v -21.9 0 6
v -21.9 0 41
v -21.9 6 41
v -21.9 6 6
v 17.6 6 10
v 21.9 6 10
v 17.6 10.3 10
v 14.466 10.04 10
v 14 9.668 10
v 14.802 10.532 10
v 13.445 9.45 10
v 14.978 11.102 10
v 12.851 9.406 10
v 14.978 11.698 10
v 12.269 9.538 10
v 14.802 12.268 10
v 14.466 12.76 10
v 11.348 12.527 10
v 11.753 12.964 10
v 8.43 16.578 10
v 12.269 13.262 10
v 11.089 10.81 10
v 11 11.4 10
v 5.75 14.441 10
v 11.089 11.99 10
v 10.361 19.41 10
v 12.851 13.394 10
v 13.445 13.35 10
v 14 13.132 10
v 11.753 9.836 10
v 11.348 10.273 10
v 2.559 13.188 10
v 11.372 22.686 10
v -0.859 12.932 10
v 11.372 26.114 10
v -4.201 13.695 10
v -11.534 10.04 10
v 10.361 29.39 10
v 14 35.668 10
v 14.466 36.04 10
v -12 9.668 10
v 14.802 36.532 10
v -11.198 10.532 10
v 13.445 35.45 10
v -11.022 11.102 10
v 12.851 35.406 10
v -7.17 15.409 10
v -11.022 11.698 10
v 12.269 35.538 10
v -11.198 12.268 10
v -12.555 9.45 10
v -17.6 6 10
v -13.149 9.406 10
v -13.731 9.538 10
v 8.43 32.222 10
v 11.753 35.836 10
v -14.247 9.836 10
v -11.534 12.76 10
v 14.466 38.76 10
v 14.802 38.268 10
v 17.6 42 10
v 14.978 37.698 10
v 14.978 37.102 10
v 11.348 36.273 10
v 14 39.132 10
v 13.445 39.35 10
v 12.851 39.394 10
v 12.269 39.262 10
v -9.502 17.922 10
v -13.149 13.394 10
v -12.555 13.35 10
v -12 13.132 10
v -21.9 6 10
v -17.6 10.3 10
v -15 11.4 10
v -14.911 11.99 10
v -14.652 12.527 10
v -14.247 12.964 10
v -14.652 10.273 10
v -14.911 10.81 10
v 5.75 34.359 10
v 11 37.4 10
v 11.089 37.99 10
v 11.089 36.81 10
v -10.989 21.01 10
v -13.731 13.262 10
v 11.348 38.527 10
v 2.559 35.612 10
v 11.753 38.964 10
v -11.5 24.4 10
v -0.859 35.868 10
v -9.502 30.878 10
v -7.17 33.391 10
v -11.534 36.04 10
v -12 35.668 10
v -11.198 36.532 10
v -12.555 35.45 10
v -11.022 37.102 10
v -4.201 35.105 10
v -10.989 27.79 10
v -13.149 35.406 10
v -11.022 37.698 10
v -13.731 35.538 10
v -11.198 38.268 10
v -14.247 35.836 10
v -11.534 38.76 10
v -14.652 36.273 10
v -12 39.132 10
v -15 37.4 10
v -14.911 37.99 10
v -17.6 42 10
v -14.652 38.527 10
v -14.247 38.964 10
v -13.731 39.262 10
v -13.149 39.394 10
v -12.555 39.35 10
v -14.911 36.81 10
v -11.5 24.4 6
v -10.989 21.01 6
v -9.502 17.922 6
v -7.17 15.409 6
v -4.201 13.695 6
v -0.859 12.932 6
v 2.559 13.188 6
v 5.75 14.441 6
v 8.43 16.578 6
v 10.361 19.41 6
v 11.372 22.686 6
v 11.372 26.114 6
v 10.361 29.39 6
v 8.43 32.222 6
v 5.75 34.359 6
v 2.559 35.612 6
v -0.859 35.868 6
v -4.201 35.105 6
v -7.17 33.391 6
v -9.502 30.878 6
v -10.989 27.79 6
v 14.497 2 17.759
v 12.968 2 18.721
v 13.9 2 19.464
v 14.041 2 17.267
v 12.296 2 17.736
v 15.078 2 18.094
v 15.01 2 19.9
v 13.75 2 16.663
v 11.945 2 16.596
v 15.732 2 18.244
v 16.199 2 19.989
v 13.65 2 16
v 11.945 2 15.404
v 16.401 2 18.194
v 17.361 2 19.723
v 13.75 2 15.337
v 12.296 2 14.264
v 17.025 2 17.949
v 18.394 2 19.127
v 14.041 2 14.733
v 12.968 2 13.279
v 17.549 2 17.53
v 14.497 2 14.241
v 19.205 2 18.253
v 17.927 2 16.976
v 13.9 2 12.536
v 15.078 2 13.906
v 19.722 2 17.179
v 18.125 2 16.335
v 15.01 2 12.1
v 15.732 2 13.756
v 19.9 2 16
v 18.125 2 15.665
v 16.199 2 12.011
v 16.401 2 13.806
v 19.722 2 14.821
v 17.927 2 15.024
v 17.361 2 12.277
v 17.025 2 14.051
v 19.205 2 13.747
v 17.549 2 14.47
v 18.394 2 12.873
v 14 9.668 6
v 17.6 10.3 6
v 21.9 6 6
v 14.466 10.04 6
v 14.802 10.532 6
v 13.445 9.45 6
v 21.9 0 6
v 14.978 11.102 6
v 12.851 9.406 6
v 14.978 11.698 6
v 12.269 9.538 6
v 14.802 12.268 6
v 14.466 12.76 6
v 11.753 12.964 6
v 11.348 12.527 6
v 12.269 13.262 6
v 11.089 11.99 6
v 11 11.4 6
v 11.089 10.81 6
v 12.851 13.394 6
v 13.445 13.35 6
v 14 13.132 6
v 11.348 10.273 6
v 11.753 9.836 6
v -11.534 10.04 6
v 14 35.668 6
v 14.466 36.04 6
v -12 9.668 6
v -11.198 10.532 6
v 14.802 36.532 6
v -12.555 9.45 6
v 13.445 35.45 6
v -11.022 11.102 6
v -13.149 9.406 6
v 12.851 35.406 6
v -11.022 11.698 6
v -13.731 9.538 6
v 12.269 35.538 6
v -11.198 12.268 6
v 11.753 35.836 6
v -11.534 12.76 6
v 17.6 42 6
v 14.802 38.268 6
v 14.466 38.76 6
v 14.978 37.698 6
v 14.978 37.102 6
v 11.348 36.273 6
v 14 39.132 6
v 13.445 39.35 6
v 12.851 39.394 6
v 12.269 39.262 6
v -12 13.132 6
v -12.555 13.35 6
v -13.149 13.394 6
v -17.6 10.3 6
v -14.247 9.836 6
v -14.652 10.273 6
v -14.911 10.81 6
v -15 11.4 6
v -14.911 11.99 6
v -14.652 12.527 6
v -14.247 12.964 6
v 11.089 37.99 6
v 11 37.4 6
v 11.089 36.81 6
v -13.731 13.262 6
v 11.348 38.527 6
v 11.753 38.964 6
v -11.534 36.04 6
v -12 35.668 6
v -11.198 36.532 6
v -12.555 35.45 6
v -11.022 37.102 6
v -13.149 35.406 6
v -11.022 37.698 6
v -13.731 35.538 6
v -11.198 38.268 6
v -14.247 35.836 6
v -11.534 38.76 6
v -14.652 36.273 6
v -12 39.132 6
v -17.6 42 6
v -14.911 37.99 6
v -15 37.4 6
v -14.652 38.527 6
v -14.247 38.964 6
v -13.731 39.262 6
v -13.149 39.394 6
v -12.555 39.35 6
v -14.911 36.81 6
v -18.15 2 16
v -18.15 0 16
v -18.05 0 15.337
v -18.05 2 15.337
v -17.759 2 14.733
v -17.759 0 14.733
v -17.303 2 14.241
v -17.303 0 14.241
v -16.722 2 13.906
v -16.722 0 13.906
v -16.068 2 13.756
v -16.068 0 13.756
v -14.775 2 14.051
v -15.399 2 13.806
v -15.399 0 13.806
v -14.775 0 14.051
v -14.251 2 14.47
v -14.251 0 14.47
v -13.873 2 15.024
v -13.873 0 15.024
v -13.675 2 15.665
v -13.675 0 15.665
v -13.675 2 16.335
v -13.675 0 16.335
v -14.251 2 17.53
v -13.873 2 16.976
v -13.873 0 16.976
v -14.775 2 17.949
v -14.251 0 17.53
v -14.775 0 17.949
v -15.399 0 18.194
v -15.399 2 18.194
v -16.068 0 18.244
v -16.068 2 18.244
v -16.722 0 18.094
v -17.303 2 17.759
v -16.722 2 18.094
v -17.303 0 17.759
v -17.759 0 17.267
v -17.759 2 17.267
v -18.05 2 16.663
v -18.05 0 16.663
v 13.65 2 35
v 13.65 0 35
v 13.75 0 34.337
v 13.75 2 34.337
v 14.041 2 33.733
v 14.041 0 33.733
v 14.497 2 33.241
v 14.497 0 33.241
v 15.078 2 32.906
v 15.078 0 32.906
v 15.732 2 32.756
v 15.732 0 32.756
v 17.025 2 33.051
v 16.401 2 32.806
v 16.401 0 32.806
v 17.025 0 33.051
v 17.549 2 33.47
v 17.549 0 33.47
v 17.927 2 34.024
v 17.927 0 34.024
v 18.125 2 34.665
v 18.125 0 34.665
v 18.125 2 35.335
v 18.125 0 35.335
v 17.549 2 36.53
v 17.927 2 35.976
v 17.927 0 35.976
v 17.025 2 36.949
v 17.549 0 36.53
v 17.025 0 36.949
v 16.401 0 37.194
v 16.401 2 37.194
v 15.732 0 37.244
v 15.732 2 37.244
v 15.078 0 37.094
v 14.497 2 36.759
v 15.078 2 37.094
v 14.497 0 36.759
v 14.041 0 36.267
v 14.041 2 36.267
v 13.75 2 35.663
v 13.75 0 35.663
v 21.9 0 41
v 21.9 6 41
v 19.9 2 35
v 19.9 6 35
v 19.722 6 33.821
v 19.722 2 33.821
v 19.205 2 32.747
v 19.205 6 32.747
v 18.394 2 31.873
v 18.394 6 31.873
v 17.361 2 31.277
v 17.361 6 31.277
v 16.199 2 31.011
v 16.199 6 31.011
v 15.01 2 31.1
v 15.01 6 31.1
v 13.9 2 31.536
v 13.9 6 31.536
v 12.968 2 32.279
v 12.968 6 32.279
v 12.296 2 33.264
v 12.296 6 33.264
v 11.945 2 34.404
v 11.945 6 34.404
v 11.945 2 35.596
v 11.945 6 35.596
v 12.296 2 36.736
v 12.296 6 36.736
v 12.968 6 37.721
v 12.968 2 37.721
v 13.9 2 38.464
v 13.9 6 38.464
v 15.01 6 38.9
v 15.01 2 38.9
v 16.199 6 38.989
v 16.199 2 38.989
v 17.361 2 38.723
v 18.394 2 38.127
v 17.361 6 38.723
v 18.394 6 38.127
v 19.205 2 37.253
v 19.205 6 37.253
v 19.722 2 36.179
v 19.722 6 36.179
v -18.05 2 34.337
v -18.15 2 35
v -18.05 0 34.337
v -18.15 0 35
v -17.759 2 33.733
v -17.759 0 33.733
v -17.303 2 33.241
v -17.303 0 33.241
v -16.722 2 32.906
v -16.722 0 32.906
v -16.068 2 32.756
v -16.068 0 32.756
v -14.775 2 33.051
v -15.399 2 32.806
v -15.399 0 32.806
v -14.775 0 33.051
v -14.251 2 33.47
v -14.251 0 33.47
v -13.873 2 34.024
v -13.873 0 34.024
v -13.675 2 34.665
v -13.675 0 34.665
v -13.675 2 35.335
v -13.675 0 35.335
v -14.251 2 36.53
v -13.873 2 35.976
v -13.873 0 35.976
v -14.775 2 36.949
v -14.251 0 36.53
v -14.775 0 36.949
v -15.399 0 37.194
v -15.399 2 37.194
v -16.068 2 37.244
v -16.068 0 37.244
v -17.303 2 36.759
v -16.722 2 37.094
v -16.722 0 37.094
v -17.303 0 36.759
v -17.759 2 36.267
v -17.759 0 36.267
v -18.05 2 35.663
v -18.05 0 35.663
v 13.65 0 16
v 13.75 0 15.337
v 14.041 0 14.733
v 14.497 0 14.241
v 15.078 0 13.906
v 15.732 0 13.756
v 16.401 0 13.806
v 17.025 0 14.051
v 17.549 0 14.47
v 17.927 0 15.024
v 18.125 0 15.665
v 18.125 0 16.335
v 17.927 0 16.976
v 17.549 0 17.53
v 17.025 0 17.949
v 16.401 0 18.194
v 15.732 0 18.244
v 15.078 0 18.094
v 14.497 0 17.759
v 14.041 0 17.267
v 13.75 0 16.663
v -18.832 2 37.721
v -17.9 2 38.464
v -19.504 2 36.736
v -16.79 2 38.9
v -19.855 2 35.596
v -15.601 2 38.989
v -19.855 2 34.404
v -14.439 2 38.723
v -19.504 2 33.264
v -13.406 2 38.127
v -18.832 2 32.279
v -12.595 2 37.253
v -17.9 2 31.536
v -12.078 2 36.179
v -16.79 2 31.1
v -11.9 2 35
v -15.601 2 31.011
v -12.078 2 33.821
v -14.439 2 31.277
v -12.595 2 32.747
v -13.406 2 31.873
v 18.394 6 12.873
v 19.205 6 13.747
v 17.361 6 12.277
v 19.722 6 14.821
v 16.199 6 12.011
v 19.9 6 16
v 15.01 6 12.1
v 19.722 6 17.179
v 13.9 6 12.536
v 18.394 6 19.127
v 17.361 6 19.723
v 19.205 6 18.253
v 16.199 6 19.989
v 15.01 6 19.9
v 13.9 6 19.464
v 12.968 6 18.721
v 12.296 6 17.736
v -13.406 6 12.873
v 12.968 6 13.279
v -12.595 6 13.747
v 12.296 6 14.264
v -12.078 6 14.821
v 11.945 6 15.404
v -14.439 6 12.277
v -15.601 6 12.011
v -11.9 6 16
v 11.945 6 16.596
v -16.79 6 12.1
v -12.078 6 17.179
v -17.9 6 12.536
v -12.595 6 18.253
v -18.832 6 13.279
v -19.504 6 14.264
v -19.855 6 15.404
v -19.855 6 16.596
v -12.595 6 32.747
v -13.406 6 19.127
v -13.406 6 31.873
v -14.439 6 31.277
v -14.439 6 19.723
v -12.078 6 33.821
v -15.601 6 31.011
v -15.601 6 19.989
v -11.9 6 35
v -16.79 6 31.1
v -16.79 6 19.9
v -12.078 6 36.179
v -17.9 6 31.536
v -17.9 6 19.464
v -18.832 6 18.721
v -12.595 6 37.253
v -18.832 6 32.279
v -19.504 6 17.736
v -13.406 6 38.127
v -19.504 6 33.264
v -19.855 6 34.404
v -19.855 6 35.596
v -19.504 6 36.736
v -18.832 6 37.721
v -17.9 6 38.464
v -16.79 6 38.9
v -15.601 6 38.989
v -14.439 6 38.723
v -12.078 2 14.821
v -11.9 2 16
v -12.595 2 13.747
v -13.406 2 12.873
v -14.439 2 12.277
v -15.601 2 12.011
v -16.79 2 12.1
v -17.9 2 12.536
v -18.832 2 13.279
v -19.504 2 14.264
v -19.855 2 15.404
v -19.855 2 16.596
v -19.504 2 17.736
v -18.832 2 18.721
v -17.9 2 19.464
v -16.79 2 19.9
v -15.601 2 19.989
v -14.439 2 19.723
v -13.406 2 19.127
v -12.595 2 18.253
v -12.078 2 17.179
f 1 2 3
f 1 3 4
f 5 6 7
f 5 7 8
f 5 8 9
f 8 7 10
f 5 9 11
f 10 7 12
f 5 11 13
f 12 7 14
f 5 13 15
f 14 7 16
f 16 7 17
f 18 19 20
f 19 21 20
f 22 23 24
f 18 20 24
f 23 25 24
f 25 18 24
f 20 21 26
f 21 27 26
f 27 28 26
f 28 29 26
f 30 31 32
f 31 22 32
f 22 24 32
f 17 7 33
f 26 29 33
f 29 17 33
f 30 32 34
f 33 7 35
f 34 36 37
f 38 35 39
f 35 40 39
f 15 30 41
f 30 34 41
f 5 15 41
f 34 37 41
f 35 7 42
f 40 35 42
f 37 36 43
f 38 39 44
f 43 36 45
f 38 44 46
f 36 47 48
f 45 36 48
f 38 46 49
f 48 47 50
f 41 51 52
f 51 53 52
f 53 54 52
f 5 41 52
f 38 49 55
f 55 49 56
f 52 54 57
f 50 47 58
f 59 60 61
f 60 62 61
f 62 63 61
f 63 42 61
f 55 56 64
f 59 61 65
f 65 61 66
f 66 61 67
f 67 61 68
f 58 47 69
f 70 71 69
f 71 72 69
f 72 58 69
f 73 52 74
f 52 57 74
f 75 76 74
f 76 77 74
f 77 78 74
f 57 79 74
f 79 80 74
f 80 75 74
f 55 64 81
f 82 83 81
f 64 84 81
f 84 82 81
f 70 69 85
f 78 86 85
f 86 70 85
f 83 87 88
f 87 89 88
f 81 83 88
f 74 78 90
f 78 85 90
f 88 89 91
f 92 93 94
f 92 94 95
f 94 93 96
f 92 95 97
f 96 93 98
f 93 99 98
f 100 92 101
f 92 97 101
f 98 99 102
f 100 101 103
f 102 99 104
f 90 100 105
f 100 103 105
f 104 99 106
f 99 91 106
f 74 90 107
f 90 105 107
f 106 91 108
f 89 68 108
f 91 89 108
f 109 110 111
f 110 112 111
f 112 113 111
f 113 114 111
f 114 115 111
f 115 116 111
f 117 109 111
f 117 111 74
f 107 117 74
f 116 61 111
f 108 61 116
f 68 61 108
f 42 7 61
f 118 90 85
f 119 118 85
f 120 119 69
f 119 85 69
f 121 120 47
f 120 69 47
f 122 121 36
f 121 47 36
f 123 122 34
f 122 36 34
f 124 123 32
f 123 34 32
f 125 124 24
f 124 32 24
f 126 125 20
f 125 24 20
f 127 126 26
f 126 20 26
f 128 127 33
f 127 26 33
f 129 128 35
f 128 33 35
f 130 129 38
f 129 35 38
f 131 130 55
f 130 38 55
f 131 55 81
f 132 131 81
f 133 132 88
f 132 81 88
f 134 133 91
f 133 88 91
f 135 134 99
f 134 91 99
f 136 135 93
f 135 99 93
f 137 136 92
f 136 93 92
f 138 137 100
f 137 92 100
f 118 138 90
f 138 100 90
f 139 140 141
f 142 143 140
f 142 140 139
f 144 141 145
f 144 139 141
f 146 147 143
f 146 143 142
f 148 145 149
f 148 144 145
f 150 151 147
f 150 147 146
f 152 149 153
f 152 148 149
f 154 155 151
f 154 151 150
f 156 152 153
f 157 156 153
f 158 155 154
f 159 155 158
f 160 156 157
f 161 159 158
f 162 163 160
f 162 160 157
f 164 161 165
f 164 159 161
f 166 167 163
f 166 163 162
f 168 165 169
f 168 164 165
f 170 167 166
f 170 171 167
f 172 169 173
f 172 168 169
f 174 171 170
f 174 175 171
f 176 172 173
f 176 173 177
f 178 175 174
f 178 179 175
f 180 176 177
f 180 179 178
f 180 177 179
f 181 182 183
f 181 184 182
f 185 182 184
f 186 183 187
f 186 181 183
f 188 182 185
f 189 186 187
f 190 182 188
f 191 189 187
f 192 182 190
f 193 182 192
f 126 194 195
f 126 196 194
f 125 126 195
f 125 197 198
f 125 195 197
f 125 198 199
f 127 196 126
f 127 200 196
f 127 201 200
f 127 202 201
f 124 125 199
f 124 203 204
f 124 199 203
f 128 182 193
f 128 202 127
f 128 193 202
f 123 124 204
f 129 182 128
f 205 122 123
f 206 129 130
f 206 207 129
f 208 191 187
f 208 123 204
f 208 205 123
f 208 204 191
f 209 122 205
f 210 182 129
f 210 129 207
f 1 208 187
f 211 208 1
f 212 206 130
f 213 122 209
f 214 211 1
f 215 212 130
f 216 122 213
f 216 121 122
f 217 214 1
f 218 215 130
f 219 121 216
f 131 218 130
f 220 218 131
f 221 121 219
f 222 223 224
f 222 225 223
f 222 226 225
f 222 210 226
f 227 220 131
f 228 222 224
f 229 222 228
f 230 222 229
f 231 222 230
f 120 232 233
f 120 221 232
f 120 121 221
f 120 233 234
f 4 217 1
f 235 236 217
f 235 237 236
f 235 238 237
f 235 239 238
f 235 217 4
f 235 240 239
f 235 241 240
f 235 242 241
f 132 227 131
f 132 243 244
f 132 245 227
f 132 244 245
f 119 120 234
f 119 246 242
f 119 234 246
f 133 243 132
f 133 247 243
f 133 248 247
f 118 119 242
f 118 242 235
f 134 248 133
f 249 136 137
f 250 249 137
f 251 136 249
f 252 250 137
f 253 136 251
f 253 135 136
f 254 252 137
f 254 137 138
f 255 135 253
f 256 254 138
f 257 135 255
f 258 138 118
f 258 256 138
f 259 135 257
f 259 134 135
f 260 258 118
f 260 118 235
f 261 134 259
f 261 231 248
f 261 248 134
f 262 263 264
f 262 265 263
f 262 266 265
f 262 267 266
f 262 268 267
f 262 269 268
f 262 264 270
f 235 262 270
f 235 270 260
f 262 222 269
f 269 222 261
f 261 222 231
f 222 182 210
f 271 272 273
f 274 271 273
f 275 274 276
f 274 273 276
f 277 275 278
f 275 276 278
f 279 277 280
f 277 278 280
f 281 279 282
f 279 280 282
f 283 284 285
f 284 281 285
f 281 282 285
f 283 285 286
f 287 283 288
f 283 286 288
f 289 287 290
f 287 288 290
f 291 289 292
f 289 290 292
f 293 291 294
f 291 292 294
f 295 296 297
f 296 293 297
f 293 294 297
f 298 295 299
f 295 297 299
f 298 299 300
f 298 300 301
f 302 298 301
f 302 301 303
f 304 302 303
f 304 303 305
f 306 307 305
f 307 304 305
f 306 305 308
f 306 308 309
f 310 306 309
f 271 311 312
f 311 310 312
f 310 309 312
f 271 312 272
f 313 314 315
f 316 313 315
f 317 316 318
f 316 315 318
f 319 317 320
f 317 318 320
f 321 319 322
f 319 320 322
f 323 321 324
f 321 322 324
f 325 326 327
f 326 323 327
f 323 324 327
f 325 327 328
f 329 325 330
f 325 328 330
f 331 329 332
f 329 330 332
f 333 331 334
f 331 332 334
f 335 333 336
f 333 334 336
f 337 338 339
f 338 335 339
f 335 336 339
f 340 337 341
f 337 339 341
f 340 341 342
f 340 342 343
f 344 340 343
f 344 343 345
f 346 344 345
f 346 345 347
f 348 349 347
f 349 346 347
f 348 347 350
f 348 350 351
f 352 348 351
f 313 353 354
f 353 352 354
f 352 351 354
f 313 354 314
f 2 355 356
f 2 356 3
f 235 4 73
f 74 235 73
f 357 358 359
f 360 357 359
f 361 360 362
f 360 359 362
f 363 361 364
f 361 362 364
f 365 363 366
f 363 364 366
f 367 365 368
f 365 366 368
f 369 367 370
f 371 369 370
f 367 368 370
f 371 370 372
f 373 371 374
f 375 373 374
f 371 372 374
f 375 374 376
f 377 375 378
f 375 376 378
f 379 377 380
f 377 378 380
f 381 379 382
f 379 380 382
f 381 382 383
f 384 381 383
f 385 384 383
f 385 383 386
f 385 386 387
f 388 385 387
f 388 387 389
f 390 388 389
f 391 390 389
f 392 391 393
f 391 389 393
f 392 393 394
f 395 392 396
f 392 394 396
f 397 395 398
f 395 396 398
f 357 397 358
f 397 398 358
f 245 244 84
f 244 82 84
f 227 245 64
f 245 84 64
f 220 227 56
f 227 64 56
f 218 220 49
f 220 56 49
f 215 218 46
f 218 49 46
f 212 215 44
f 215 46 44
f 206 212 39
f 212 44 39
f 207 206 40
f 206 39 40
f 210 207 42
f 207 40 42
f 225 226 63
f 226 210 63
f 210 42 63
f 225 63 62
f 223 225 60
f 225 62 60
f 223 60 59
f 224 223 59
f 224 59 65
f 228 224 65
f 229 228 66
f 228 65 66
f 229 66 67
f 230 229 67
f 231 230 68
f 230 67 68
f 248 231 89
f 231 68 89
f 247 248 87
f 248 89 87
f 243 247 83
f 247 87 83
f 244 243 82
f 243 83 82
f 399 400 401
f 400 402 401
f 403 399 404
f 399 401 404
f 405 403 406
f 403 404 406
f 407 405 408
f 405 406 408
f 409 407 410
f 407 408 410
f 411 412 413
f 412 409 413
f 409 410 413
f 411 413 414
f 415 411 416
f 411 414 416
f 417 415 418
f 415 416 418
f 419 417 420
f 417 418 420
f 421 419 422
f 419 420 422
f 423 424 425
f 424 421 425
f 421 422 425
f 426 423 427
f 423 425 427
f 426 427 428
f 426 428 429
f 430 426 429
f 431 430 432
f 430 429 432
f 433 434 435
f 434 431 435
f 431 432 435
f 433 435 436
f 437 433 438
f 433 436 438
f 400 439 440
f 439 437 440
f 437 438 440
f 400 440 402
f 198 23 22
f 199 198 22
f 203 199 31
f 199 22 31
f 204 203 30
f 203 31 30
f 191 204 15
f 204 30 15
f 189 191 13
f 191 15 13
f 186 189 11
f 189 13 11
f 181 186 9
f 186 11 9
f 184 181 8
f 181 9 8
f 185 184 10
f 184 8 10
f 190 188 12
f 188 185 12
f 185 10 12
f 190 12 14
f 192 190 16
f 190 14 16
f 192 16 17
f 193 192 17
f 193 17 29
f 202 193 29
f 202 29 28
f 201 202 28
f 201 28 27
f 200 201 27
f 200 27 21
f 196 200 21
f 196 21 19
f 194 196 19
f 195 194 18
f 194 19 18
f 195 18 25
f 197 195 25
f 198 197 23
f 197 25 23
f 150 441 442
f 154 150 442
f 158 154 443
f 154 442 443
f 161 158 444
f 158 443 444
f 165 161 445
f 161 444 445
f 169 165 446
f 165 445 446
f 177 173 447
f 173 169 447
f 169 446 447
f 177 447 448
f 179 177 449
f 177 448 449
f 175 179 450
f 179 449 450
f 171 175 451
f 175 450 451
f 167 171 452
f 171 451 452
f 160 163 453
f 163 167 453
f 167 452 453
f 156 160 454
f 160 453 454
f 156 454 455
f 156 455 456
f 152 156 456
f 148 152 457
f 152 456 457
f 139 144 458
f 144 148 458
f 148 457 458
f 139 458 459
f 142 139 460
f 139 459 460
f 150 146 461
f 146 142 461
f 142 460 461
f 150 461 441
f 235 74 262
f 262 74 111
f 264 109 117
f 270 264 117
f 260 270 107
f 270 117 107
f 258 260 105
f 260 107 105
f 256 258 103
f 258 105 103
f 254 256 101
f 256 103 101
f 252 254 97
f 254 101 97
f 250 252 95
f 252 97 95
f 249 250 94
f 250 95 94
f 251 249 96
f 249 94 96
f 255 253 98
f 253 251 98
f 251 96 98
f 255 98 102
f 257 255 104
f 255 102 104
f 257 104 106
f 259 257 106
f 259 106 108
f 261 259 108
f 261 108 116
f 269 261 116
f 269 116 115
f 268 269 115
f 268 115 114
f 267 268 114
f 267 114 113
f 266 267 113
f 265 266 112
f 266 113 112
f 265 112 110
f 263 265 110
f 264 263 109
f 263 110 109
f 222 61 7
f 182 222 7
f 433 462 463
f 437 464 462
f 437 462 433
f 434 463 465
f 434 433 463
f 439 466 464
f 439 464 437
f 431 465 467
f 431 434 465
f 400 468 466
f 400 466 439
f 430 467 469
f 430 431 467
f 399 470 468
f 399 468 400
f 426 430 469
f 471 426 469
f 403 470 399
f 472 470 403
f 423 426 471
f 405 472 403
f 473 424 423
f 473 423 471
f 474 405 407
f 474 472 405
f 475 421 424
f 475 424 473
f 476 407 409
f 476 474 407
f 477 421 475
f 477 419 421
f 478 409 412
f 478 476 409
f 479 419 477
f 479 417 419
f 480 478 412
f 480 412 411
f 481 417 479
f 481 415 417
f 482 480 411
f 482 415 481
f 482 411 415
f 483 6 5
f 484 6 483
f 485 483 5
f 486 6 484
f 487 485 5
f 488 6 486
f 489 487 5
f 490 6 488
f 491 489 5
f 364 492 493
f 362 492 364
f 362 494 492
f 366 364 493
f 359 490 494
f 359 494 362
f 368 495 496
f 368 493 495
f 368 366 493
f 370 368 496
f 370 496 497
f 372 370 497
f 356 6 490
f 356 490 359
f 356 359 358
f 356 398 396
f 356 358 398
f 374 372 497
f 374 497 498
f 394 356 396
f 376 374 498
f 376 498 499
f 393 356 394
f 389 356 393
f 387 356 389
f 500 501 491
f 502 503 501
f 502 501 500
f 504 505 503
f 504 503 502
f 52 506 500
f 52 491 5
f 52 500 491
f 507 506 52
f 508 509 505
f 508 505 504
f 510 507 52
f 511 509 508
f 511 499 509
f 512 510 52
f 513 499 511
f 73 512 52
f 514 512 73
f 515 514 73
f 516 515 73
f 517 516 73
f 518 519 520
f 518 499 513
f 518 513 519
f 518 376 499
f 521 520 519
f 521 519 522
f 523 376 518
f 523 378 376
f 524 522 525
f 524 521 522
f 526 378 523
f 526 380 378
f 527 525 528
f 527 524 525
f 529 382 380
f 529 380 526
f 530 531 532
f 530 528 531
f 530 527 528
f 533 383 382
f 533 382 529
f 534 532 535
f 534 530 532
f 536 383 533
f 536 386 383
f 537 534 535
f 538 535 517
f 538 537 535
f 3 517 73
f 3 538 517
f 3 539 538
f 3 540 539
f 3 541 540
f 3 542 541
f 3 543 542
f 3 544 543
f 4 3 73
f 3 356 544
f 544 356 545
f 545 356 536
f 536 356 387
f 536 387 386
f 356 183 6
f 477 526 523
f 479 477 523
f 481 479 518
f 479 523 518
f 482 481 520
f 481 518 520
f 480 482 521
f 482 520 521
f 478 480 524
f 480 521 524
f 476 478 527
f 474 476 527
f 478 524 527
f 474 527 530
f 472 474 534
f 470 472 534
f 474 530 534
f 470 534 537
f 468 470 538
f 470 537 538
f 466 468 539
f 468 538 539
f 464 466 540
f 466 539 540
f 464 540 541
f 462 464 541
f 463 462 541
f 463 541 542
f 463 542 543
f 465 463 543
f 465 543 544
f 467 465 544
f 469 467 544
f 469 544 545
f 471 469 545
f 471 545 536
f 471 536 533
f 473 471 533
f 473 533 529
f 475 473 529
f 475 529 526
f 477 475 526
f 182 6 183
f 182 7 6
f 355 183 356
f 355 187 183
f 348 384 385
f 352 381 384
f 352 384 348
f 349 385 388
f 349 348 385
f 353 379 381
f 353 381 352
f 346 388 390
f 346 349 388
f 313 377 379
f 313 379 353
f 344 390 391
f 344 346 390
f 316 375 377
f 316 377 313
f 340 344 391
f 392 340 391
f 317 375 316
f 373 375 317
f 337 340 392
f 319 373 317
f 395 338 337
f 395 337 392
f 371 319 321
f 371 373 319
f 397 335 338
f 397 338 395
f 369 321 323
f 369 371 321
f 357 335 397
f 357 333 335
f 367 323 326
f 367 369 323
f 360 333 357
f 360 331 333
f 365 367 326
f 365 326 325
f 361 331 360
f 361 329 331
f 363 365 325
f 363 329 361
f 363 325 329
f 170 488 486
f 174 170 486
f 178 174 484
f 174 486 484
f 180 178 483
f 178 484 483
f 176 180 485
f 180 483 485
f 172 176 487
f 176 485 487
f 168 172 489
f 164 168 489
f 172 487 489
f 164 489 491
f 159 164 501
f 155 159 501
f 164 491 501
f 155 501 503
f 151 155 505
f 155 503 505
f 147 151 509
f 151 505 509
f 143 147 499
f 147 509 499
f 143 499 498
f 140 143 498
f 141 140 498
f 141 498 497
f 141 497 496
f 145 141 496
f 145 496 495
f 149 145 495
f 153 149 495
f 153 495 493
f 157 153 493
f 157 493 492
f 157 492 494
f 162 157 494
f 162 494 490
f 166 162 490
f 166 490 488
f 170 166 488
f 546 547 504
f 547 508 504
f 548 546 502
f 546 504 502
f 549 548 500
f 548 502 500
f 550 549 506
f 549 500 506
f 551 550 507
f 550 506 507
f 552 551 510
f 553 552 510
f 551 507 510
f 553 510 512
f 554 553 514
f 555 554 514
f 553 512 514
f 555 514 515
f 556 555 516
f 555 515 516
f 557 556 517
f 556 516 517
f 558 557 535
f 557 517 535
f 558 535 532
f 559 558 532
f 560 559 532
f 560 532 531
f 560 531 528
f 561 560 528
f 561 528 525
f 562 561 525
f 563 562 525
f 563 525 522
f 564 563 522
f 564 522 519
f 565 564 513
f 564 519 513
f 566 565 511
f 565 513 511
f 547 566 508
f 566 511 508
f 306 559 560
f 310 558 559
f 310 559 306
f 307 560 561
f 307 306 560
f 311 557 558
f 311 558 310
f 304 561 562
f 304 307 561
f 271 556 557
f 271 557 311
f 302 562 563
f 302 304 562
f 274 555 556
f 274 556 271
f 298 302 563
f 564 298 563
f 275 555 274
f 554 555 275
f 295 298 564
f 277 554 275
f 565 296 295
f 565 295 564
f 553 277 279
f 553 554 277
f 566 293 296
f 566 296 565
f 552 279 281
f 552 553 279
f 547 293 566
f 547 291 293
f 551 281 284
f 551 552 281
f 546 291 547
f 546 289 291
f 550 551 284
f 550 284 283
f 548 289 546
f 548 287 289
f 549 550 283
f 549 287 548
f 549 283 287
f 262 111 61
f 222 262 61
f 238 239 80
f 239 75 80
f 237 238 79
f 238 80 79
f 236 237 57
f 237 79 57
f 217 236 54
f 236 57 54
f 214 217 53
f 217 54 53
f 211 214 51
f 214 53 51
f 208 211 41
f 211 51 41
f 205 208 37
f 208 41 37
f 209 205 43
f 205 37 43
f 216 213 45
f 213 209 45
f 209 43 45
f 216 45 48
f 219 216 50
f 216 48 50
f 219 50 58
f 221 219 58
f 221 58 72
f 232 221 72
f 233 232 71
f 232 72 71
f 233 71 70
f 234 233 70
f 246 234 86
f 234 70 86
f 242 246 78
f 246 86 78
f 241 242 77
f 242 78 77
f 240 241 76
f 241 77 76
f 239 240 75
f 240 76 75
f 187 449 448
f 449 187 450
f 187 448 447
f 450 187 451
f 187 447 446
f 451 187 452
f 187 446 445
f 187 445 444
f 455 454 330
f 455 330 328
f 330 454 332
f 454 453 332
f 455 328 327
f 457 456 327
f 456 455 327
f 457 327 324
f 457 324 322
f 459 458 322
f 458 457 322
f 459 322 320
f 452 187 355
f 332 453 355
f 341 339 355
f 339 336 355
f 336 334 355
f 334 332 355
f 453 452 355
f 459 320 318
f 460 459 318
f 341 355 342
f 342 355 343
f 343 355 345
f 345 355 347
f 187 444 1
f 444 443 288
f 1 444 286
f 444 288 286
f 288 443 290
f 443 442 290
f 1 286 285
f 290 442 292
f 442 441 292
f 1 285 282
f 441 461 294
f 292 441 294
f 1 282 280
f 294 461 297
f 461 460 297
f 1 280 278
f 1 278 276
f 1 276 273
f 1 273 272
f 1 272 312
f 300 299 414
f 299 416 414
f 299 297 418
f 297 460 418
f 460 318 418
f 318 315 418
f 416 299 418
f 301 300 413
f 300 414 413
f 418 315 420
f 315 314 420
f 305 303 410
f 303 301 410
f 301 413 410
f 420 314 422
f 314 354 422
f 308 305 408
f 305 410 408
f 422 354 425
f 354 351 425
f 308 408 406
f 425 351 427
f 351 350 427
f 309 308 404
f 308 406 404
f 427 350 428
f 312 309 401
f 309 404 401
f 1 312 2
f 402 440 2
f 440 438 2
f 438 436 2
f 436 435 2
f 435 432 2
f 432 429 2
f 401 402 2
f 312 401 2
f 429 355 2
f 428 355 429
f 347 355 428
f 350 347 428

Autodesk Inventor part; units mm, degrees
ref_plane "YZ Plane" through (0, 0, 0) normal (1, 0, 0) x (0, 1, 0)
ref_plane "XZ Plane" through (0, 0, 0) normal (0, 1, 0) x (-1, 0, 0)
ref_plane "XY Plane" through (0, 0, 0) normal (0, 0, 1) x (1, 0, 0)
sketch "Sketch1" plane through (0, 0, 0) normal (0, 1, 0) x (-1, 0, 0)
  circle A0 centre (15.9, 35) radius 2.25
  circle A1 centre (15.9, 16) radius 2.25
  circle A2 centre (-15.9, 16) radius 2.25
  circle A3 centre (-15.9, 35) radius 2.25
  line L0 (21.9, 10) -> (-21.9, 10)
  line L1 (-21.9, 10) -> (-21.9, 41)
  line L2 (-21.9, 41) -> (21.9, 41)
  line L3 (21.9, 41) -> (21.9, 10)
  point P0 (0, 0)
  point P1 (0, 0)
  dimension "d0" = 43.8
  dimension "d1" = 31
extrude "Extrusion1" add sketch "Sketch1" along normal blind 6
sketch "Sketch2" plane through (0, 6, 0) normal (0, 1, 0) x (1, 0, 0)
  circle A0 centre (-15.9, -16) radius 2.25 projected
  circle A1 centre (-15.9, -16) radius 4
  circle A2 centre (-15.9, -35) radius 2.25 projected
  circle A3 centre (-15.9, -35) radius 4
  circle A4 centre (15.9, -35) radius 2.25 projected
  circle A5 centre (15.9, -35) radius 4
  circle A6 centre (15.9, -16) radius 2.25 projected
  circle A7 centre (15.9, -16) radius 4
  point P0 (0, 0)
  dimension "d4" = 8
  dimension "d5" = 8
  dimension "d6" = 8
  dimension "d7" = 8
extrude "Extrusion2" cut sketch "Sketch2" against normal blind 4
sketch "Sketch3" plane through (21.9, 0, 10) normal (0, 0, -1) x (-1, 0, 0)
  line L0 (43.8, 0) -> (0, 0) projected
  line L1 (43.8, 0) -> (43.8, 6) projected
  line L2 (0, 6) -> (43.8, 6) projected
  line L3 (0, 0) -> (0, 6) projected
  line L4 (43.8, 6) -> (0, 6) projected
  line L5 (21.9, 6) -> (39.5, 6)
  line L6 (39.5, 6) -> (39.5, 42)
  line L7 (39.5, 42) -> (21.9, 42)
  line L8 (39.5, 42) -> (4.3, 42)
  line L9 (4.3, 42) -> (4.3, 6)
  line L10 (4.3, 6) -> (39.5, 6)
  line L11 (39.5, 6.8) -> (39.5, 42)
  circle A0 centre (34.9, 37.4) radius 2
  circle A1 centre (8.9, 37.4) radius 2
  circle A2 centre (8.9, 11.4) radius 2
  circle A3 centre (34.9, 11.4) radius 2
  circle A4 centre (21.9, 24.4) radius 11.5
  point P0 (21.9, 0)
  dimension "d16" = 4
  dimension "d19" = 360
  dimension "d21" = 23
extrude "Extrusion3" add sketch "Sketch3" along normal blind 4
chamfer "Chamfer1" distance 4.3 angle 45 1 edges at (17.6, 6, 8)
chamfer "Chamfer2" distance 4.3 angle 45 1 edges at (-17.6, 6, 8)
properties part number "NEMA14 Mounting Bracket"
